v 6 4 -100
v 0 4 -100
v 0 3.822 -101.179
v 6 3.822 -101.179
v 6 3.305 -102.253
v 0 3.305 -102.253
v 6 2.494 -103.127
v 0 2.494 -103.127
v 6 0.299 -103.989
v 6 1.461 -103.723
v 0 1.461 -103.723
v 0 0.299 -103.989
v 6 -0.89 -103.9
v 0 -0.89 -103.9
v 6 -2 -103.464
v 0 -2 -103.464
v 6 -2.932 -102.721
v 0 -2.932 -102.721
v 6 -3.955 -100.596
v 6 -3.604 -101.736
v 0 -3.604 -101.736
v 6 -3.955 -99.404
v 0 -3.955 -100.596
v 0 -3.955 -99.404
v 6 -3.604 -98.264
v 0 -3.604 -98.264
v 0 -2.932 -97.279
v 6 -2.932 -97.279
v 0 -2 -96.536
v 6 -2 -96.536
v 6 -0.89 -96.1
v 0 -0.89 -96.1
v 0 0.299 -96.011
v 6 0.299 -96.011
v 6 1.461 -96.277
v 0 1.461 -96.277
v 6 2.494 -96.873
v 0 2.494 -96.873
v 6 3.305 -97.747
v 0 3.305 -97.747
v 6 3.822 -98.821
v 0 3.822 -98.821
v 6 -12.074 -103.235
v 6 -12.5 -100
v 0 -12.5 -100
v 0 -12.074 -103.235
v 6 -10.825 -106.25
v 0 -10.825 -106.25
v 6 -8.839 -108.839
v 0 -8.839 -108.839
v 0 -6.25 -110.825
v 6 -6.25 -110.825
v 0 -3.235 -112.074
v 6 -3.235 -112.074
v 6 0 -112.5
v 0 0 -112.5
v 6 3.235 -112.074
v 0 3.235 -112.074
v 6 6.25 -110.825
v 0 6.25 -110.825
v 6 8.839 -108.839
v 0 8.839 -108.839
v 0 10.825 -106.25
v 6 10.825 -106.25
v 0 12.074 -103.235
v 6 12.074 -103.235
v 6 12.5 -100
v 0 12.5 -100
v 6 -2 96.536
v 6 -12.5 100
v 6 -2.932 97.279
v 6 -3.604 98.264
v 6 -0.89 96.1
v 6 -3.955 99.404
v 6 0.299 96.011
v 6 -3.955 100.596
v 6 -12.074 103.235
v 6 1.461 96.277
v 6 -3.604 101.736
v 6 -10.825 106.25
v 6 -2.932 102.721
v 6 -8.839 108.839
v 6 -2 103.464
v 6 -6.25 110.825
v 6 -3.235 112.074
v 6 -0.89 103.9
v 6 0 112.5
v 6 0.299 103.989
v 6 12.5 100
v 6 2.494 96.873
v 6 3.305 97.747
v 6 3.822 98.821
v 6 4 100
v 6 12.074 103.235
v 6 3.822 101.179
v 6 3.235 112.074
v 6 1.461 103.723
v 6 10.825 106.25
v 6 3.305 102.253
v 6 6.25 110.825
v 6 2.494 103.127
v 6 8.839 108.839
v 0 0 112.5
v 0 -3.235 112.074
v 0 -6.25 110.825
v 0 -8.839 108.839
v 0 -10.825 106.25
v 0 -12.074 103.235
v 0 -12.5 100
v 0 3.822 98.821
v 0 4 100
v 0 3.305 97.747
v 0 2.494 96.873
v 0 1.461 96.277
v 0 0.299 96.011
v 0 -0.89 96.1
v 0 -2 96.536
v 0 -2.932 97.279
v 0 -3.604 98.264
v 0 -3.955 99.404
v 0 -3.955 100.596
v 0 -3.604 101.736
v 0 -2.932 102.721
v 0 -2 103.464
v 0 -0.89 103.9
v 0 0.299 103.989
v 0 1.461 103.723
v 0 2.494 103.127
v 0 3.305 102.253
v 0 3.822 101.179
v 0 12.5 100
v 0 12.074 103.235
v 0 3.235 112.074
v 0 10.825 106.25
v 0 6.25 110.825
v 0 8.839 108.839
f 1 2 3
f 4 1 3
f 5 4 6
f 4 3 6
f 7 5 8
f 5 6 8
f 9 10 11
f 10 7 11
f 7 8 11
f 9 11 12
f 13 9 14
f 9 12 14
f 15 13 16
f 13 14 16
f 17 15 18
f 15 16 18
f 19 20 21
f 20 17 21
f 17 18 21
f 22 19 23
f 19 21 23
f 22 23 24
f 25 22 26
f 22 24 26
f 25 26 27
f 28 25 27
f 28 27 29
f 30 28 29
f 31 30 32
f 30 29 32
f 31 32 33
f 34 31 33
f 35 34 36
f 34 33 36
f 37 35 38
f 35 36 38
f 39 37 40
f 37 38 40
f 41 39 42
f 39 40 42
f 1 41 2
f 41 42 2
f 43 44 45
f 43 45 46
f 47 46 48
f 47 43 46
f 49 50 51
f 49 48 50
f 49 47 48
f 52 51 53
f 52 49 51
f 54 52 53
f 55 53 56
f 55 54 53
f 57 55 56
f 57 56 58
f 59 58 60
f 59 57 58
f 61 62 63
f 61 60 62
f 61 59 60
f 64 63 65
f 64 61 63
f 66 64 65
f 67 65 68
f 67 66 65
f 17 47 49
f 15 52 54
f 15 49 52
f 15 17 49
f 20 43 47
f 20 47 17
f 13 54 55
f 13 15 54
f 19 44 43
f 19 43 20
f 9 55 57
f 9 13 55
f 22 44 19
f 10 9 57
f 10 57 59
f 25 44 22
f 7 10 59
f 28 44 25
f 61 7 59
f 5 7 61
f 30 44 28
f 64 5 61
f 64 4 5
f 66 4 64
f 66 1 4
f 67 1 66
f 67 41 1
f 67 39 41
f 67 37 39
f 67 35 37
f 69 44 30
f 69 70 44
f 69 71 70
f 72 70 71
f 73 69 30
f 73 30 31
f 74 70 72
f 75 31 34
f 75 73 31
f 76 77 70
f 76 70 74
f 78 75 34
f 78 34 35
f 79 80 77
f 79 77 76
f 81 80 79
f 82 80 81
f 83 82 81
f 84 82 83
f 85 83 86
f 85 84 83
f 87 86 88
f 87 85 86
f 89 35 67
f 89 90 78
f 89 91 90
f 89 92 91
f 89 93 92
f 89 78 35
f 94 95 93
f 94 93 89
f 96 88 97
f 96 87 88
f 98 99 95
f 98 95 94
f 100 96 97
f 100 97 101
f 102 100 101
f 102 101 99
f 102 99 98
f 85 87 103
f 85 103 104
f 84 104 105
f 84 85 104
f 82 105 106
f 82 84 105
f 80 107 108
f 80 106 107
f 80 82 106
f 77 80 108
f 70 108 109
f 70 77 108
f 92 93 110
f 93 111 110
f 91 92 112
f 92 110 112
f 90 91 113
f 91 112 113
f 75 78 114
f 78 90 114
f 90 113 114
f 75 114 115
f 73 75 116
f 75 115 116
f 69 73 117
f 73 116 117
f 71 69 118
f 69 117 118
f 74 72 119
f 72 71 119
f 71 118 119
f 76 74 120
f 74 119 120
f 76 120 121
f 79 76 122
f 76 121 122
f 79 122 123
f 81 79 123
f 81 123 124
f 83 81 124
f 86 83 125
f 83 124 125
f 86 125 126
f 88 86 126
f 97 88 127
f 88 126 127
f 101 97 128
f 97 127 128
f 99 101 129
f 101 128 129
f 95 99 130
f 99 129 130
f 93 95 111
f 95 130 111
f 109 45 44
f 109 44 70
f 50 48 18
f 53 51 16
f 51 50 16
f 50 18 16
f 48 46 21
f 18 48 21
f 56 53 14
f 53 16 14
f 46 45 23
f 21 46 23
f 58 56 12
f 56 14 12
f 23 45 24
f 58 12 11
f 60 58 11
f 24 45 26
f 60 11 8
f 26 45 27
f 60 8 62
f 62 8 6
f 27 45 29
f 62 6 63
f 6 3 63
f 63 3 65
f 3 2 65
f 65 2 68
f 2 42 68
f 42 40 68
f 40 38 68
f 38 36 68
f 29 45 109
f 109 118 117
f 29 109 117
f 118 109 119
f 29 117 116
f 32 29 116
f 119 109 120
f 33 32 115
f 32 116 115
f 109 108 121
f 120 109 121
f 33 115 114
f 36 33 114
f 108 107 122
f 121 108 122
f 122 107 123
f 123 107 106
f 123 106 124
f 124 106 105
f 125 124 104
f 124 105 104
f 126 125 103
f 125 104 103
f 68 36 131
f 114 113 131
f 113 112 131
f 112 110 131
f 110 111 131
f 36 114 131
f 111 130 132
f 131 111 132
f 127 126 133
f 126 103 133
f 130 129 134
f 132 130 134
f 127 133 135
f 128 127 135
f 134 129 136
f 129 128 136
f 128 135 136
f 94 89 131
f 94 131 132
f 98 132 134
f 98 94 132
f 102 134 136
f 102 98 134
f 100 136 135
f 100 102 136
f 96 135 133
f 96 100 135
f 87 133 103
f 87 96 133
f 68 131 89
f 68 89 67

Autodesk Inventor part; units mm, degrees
ref_plane "YZ Plane" through (0, 0, 0) normal (1, 0, 0) x (0, 1, 0)
ref_plane "XZ Plane" through (0, 0, 0) normal (0, 1, 0) x (-1, 0, 0)
ref_plane "XY Plane" through (0, 0, 0) normal (0, 0, 1) x (1, 0, 0)
sketch "Sketch1" plane through (0, 0, 0) normal (1, 0, 0) x (0, 1, 0)
  line L0 (12.5, 112.5) -> (12.5, -112.5)
  line L1 (12.5, -112.5) -> (-12.5, -112.5)
  line L2 (-12.5, -112.5) -> (-12.5, 112.5)
  line L3 (-12.5, 112.5) -> (12.5, 112.5)
  circle A0 centre (0, 100) radius 4
  circle A1 centre (0, -100) radius 4
  point P0 (0, 0)
  point P1 (-12.5, 94)
  point P2 (-12.5, 97.9432)
  dimension "d0" = 225
  dimension "d1" = 25
  dimension "d2" = 12.5
  dimension "d3" = 112.5
  dimension "d4" = 8
  dimension "d5" = 12.5
  dimension "d6" = 8
  dimension "d7" = 12.5
extrude "Extrusion1" add sketch "Sketch1" along normal blind 6
full round fillet "Full Round Fillet1" first side at (2, 12.5, -37.5) centre faces at (2, 4.1667, 112.5) second side at (2, -12.5, 37.5)
full round fillet "Full Round Fillet2" first side at (2, 12.5, -41.6666) centre faces at (2, -4.1667, -112.5) second side at (2, -12.5, 29.1667)
thread "Thread3" size "M8x1.25" class "6H" standard "ANSI Metric M Profile" length 350
thread "Thread4" size "M8x1.25" class "6H" standard "ANSI Metric M Profile" length 350
properties part number "Braço Macaco" material "Steel AISI 1050"
